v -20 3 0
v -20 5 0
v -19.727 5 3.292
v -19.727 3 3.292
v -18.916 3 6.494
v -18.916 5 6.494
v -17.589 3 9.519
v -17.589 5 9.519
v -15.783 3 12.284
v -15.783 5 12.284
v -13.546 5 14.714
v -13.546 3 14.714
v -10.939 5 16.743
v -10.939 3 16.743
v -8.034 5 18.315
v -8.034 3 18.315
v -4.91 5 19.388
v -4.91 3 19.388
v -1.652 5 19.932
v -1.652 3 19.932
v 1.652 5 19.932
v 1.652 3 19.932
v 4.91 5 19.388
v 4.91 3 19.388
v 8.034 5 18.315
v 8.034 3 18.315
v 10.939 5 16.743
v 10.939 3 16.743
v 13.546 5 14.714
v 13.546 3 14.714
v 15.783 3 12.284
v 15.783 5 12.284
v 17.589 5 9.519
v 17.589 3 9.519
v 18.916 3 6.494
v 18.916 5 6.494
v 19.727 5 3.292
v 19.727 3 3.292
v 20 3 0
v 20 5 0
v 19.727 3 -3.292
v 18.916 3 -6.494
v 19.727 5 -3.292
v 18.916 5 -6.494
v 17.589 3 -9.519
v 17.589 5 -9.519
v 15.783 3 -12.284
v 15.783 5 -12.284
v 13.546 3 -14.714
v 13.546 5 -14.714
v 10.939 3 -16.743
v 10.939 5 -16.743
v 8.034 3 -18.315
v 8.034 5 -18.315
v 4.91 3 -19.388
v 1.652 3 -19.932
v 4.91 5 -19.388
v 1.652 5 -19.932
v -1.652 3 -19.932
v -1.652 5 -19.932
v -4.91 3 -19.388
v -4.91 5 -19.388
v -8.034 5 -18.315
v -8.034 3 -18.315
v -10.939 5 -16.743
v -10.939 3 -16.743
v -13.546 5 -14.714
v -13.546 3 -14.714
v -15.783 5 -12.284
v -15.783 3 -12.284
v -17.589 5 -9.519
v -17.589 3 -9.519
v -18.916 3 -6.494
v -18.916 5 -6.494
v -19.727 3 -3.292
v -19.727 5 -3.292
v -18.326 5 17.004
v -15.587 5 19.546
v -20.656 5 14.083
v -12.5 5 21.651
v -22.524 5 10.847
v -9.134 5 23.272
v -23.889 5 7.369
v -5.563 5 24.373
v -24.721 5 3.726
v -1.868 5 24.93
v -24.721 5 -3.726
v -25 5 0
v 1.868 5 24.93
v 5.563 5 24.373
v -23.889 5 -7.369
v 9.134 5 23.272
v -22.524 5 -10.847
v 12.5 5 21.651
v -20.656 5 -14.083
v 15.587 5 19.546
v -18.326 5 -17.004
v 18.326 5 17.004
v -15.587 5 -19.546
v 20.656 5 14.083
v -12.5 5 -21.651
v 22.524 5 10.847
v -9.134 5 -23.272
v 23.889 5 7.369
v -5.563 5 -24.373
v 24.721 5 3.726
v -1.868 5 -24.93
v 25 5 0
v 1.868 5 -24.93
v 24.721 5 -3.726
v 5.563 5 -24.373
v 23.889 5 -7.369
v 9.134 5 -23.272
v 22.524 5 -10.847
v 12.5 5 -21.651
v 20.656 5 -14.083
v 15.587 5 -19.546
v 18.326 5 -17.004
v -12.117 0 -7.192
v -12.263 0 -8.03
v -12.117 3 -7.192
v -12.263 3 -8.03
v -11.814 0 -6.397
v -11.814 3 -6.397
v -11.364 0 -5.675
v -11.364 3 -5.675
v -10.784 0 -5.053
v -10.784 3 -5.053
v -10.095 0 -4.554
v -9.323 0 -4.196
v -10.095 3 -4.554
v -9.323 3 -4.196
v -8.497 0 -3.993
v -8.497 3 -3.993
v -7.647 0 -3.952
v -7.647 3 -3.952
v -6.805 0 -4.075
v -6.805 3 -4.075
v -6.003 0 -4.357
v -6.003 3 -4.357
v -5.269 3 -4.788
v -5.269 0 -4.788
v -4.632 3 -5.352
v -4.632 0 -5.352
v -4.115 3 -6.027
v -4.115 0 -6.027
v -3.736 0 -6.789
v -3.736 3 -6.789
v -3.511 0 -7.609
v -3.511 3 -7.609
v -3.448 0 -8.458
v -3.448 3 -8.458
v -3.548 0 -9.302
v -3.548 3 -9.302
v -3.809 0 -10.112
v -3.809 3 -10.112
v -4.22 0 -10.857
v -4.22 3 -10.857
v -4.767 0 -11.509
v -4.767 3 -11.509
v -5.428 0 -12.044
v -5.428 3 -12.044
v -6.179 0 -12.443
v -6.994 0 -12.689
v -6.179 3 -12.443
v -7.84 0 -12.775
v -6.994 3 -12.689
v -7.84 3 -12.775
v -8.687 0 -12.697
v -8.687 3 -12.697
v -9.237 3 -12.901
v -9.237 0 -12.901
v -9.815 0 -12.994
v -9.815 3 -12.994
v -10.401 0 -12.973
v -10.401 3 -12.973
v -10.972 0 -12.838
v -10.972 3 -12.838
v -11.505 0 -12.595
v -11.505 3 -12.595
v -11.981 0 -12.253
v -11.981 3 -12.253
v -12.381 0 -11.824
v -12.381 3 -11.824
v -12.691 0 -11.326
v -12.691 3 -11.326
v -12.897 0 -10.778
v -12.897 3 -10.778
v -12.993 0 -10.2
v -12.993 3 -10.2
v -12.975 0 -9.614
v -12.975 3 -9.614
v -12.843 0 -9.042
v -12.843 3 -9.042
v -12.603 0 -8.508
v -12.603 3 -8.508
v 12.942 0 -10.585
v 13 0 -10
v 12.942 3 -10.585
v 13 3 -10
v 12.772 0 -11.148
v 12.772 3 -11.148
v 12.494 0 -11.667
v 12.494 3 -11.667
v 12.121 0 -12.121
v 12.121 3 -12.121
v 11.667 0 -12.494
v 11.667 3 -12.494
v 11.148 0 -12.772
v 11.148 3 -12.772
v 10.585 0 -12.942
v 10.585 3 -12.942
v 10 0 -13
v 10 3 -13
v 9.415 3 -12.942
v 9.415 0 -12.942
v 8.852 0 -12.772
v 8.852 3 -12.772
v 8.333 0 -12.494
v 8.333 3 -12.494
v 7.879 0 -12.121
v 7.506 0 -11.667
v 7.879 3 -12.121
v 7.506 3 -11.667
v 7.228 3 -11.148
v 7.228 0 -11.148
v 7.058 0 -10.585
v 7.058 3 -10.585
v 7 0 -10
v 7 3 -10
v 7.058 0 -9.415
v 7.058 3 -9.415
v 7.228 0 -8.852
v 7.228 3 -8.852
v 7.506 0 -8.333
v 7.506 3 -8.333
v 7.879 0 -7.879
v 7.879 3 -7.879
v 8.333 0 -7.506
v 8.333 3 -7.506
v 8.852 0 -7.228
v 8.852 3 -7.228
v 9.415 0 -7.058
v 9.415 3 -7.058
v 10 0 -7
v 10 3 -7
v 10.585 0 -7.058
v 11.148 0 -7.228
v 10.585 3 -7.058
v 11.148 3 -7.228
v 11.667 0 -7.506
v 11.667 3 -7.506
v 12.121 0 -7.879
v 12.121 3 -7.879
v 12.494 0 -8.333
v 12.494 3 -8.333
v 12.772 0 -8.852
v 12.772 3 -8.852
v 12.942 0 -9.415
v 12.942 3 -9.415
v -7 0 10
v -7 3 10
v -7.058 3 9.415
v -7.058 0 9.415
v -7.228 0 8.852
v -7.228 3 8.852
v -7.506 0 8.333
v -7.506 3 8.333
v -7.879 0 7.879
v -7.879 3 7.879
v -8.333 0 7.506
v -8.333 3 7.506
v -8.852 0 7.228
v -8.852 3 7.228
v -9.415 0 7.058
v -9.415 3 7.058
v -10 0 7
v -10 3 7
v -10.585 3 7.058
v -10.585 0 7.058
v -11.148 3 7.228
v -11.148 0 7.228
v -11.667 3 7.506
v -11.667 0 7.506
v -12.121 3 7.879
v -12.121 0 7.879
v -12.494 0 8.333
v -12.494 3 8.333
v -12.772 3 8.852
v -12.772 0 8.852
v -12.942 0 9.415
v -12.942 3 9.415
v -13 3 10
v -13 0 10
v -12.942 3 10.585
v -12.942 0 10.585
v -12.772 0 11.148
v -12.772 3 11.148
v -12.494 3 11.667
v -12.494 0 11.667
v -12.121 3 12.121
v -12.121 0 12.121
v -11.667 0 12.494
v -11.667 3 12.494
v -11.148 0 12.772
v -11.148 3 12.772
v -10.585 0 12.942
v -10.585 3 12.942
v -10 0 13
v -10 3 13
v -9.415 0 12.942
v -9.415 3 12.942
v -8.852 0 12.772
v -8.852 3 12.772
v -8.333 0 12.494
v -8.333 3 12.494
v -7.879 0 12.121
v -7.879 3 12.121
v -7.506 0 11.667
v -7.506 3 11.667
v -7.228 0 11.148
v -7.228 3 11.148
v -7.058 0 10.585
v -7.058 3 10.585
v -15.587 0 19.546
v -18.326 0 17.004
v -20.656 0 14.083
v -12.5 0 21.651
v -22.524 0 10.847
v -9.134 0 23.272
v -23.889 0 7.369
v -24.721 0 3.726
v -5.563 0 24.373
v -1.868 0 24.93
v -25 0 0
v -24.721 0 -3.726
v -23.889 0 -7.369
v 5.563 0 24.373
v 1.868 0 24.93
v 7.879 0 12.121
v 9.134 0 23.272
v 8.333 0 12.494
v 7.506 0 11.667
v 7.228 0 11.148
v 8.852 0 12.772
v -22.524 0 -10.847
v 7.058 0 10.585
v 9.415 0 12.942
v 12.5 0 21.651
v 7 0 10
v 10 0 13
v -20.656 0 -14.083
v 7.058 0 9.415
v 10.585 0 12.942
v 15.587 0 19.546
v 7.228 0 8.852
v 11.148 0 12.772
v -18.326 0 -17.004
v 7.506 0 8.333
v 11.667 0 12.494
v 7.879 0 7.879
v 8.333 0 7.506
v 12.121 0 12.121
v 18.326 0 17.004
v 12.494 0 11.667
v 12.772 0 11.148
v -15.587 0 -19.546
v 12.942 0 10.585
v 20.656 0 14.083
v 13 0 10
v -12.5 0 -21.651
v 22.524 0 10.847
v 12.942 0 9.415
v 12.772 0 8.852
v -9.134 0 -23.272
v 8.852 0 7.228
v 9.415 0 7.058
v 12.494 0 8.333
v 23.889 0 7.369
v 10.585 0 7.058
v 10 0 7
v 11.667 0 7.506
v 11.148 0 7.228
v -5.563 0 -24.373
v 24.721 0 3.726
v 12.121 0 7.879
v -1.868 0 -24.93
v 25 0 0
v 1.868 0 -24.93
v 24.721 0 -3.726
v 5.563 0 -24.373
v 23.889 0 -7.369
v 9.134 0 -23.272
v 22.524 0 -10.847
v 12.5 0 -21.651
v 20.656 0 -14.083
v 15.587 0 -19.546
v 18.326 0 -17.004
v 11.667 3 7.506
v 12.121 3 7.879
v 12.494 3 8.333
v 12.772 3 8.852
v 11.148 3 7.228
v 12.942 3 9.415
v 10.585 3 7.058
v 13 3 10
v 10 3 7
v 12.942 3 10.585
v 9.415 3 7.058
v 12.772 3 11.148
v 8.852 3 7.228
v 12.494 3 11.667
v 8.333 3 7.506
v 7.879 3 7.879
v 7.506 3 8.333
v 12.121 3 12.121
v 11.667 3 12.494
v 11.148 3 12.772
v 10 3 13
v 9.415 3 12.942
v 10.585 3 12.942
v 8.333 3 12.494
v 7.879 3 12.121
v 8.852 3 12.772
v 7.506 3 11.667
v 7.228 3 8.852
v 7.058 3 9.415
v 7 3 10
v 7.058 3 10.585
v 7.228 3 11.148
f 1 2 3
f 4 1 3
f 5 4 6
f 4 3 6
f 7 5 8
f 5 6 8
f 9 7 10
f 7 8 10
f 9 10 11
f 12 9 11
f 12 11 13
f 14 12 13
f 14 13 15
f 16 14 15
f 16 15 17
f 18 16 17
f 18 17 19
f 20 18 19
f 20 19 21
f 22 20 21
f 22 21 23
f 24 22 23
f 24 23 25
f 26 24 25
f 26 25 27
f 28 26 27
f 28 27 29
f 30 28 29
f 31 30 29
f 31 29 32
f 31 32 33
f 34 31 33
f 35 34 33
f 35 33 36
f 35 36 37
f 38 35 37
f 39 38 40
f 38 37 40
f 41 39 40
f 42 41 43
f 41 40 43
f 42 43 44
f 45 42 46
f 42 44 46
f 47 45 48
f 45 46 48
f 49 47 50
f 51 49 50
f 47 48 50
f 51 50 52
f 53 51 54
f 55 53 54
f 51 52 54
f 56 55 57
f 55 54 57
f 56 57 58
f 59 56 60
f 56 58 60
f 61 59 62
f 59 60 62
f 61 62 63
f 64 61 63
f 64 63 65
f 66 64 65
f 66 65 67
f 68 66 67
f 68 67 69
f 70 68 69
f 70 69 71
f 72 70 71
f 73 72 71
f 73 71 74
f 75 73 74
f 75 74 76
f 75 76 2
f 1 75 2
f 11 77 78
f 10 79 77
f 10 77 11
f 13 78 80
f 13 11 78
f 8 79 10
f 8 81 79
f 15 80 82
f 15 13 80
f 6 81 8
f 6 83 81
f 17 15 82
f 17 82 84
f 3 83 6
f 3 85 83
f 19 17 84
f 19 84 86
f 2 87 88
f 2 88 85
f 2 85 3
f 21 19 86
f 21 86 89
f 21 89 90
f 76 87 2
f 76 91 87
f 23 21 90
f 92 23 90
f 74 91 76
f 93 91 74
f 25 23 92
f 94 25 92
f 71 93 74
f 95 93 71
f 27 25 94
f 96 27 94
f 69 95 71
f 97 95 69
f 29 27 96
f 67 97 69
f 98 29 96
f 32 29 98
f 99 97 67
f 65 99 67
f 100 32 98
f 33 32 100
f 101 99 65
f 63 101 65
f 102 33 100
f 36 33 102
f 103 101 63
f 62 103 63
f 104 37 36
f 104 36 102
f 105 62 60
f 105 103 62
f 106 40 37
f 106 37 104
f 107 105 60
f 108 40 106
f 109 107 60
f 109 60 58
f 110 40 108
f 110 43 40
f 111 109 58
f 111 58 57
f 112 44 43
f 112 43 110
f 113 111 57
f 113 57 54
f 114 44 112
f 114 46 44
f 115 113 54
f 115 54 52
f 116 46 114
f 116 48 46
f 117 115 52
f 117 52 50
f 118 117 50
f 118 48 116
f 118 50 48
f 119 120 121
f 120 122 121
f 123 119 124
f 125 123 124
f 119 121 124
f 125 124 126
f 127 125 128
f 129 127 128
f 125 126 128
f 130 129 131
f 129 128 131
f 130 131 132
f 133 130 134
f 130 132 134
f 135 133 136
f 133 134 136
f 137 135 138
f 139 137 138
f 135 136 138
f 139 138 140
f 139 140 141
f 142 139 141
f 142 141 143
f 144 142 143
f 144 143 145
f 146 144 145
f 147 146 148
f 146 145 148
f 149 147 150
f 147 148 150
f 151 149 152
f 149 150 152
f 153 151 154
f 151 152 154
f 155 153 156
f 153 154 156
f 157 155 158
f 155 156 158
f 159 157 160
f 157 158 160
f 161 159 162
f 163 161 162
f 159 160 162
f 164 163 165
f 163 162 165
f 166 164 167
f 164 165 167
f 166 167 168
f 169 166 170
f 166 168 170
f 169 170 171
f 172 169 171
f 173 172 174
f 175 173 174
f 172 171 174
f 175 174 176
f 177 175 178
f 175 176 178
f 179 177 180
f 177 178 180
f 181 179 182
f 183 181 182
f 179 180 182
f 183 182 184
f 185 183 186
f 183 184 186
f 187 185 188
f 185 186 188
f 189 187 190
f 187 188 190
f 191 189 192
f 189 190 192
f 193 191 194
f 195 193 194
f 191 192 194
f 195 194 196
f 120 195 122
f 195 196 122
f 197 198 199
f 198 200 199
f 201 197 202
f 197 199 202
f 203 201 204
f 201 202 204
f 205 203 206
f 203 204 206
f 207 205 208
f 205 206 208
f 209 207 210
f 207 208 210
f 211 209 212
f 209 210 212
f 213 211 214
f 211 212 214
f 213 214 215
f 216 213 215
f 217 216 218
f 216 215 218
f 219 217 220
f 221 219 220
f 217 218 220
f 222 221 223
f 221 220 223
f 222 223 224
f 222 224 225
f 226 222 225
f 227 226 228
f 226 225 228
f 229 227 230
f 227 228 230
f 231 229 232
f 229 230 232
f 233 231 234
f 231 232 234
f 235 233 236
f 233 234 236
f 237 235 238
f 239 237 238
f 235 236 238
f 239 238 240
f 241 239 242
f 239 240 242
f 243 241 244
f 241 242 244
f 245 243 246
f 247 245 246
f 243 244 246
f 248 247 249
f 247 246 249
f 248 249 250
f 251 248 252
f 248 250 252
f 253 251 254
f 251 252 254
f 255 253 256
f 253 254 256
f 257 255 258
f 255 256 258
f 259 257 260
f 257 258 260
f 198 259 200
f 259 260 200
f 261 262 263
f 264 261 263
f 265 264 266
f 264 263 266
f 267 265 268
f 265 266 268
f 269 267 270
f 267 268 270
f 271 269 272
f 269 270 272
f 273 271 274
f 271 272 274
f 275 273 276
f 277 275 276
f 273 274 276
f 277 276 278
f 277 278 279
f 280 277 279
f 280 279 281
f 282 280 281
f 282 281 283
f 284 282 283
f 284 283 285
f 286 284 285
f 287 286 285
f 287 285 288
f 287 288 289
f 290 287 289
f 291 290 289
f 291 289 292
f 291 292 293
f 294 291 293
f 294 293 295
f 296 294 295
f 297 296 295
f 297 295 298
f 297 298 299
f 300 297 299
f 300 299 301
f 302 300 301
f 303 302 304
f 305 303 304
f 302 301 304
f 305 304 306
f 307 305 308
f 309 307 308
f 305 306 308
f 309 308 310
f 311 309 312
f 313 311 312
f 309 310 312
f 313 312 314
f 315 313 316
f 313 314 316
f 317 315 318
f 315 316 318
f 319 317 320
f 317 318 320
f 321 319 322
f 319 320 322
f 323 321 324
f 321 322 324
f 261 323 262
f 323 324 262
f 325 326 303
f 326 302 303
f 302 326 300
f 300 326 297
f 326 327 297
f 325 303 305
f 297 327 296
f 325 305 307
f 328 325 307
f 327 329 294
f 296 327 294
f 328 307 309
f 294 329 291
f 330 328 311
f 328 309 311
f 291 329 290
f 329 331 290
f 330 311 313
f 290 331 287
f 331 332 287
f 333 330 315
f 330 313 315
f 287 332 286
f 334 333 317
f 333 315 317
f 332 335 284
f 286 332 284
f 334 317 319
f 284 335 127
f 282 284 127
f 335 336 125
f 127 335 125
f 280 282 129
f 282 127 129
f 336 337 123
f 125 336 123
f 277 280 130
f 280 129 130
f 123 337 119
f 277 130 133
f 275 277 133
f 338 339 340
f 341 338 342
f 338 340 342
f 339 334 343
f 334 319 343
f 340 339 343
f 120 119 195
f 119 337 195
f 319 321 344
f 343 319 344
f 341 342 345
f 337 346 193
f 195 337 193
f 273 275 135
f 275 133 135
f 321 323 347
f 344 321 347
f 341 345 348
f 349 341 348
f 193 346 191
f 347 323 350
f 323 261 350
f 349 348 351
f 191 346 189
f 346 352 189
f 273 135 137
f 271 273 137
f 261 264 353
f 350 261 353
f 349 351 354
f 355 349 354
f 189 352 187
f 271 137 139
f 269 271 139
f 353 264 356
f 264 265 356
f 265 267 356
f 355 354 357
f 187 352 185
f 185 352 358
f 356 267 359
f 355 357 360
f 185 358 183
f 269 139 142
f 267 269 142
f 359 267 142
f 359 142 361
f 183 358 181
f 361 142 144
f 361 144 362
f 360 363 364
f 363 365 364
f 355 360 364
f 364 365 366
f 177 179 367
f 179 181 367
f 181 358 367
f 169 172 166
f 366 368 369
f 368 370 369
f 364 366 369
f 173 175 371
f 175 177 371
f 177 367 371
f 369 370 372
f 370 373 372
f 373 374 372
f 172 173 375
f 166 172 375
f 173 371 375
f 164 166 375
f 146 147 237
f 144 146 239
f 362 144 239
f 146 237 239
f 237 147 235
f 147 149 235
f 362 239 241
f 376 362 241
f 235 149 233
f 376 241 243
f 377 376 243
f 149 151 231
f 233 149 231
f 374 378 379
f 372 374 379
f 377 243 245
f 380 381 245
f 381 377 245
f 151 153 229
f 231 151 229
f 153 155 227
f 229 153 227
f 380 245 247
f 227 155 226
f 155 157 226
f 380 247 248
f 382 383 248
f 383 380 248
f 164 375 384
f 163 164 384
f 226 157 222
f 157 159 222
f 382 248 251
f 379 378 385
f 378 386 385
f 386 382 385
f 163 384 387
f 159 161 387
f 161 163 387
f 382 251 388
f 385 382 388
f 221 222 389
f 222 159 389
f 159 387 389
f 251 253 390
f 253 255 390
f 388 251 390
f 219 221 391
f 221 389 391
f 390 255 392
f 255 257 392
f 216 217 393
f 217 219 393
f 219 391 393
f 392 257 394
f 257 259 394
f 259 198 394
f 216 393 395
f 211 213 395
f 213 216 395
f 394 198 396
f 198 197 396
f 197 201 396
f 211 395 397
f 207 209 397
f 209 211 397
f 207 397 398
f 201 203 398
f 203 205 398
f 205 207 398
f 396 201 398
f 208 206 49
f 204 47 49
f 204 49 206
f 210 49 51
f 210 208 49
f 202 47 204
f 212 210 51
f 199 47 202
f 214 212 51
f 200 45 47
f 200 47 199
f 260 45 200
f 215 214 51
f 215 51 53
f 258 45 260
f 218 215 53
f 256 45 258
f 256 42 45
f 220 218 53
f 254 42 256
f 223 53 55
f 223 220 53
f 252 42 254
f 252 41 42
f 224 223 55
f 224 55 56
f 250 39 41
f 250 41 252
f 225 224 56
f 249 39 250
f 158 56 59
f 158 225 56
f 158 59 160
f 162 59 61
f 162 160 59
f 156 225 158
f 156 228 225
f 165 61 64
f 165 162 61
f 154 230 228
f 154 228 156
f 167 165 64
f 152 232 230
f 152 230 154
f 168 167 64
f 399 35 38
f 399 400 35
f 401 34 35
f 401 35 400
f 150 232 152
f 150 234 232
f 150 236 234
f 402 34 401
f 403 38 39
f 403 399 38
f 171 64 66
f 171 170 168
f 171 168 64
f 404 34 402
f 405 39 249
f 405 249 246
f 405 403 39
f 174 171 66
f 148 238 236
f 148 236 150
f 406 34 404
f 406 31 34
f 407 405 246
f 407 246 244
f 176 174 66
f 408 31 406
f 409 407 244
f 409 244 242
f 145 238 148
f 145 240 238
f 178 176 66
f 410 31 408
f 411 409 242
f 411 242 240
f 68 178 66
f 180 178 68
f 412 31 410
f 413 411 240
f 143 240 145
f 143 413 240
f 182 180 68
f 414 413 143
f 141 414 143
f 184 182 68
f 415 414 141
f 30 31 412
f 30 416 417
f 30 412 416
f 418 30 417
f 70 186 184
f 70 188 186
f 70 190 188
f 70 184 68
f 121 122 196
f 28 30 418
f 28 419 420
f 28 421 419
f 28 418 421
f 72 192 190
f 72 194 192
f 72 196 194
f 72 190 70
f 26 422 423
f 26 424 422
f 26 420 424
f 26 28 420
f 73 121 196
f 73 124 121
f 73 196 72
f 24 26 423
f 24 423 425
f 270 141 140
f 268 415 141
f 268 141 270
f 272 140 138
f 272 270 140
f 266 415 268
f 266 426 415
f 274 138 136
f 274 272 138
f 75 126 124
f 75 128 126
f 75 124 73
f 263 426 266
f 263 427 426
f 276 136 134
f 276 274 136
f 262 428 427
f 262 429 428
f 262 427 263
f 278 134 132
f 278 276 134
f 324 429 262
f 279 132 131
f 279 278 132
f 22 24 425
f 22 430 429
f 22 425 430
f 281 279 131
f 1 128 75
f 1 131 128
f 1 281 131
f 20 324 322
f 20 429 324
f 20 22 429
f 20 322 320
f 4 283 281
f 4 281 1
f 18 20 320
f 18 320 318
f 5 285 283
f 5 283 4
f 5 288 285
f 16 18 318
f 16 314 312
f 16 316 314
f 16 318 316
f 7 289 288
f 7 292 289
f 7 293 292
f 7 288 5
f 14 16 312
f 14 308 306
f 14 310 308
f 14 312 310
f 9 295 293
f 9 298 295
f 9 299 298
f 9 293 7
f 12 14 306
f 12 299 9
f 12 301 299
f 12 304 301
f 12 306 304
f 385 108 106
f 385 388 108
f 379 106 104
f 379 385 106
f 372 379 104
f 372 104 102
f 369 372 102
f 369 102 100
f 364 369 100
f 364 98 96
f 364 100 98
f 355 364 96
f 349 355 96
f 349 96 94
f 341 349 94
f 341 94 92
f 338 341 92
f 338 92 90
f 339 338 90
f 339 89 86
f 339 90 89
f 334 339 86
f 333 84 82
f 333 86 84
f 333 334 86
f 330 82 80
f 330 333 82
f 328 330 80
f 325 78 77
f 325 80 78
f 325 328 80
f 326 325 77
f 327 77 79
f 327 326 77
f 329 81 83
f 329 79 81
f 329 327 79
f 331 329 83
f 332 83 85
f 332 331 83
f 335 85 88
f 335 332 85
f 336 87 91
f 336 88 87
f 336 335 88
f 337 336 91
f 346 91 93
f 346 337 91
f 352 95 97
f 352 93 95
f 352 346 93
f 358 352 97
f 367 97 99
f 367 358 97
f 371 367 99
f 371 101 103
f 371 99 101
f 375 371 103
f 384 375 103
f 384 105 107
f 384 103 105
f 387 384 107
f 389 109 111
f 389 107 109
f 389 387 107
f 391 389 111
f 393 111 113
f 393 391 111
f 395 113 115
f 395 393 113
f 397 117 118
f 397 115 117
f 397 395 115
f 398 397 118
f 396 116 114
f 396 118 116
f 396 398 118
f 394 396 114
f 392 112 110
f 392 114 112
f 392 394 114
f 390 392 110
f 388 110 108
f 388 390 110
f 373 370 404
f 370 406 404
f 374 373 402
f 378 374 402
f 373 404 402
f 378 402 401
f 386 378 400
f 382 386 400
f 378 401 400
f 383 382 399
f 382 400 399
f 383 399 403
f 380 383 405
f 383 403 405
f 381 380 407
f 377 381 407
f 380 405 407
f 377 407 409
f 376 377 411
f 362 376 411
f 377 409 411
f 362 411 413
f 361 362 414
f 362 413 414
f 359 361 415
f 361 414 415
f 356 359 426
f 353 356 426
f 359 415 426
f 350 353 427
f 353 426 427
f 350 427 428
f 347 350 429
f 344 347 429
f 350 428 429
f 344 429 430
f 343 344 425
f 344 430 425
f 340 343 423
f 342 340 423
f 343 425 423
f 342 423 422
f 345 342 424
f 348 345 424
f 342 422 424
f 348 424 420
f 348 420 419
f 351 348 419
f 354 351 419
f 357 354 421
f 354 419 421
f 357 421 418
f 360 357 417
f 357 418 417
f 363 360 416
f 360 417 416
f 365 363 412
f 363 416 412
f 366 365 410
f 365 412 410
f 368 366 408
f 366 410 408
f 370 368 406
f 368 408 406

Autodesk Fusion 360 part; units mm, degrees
sketch "草图1" plane through (0, 0, 0) normal (0, 1, 0) x (1, 0, 0)
  circle A0 centre (0, 0) radius 25
extrude "拉伸1" add sketch "草图1" along normal blind 5
sketch "草图2" plane through (0, 5, 0) normal (0, 1, 0) x (-1, 0, 0)
  circle A0 centre (0, 0) radius 25
  circle A1 centre (0, 0) radius 20
extrude "拉伸2" cut sketch "草图2" against normal blind 2 contours A1
sketch "草图3" plane through (0, 3, 0) normal (0, 1, 0) x (-1, 0, 0)
  circle A0 centre (0, 0) radius 20
  circle A1 centre (7.861, -8.3613) radius 4.4141
cylinder "圆柱体基本要素1" cut diameter 6 height -10 placed x (1, 0, 0) y (0, 0, -1) z (0, 1, 0) at (-10, 3, -10)
cylinder "圆柱体基本要素2" cut diameter 6 height -8 placed x (1, 0, 0) y (0, 0, -1) z (0, 1, 0) at (10, 3, -10)
cylinder "圆柱体基本要素3" cut diameter 6 height -6 placed x (1, 0, 0) y (0, 0, -1) z (0, 1, 0) at (-10, 3, 10)
cylinder "圆柱体基本要素4" cut diameter 6 height -5 placed x (1, 0, 0) y (0, 0, -1) z (0, 1, 0) at (10, 3, 10)
extrude "拉伸3" cut sketch "草图3" against normal blind 5 contours A1
